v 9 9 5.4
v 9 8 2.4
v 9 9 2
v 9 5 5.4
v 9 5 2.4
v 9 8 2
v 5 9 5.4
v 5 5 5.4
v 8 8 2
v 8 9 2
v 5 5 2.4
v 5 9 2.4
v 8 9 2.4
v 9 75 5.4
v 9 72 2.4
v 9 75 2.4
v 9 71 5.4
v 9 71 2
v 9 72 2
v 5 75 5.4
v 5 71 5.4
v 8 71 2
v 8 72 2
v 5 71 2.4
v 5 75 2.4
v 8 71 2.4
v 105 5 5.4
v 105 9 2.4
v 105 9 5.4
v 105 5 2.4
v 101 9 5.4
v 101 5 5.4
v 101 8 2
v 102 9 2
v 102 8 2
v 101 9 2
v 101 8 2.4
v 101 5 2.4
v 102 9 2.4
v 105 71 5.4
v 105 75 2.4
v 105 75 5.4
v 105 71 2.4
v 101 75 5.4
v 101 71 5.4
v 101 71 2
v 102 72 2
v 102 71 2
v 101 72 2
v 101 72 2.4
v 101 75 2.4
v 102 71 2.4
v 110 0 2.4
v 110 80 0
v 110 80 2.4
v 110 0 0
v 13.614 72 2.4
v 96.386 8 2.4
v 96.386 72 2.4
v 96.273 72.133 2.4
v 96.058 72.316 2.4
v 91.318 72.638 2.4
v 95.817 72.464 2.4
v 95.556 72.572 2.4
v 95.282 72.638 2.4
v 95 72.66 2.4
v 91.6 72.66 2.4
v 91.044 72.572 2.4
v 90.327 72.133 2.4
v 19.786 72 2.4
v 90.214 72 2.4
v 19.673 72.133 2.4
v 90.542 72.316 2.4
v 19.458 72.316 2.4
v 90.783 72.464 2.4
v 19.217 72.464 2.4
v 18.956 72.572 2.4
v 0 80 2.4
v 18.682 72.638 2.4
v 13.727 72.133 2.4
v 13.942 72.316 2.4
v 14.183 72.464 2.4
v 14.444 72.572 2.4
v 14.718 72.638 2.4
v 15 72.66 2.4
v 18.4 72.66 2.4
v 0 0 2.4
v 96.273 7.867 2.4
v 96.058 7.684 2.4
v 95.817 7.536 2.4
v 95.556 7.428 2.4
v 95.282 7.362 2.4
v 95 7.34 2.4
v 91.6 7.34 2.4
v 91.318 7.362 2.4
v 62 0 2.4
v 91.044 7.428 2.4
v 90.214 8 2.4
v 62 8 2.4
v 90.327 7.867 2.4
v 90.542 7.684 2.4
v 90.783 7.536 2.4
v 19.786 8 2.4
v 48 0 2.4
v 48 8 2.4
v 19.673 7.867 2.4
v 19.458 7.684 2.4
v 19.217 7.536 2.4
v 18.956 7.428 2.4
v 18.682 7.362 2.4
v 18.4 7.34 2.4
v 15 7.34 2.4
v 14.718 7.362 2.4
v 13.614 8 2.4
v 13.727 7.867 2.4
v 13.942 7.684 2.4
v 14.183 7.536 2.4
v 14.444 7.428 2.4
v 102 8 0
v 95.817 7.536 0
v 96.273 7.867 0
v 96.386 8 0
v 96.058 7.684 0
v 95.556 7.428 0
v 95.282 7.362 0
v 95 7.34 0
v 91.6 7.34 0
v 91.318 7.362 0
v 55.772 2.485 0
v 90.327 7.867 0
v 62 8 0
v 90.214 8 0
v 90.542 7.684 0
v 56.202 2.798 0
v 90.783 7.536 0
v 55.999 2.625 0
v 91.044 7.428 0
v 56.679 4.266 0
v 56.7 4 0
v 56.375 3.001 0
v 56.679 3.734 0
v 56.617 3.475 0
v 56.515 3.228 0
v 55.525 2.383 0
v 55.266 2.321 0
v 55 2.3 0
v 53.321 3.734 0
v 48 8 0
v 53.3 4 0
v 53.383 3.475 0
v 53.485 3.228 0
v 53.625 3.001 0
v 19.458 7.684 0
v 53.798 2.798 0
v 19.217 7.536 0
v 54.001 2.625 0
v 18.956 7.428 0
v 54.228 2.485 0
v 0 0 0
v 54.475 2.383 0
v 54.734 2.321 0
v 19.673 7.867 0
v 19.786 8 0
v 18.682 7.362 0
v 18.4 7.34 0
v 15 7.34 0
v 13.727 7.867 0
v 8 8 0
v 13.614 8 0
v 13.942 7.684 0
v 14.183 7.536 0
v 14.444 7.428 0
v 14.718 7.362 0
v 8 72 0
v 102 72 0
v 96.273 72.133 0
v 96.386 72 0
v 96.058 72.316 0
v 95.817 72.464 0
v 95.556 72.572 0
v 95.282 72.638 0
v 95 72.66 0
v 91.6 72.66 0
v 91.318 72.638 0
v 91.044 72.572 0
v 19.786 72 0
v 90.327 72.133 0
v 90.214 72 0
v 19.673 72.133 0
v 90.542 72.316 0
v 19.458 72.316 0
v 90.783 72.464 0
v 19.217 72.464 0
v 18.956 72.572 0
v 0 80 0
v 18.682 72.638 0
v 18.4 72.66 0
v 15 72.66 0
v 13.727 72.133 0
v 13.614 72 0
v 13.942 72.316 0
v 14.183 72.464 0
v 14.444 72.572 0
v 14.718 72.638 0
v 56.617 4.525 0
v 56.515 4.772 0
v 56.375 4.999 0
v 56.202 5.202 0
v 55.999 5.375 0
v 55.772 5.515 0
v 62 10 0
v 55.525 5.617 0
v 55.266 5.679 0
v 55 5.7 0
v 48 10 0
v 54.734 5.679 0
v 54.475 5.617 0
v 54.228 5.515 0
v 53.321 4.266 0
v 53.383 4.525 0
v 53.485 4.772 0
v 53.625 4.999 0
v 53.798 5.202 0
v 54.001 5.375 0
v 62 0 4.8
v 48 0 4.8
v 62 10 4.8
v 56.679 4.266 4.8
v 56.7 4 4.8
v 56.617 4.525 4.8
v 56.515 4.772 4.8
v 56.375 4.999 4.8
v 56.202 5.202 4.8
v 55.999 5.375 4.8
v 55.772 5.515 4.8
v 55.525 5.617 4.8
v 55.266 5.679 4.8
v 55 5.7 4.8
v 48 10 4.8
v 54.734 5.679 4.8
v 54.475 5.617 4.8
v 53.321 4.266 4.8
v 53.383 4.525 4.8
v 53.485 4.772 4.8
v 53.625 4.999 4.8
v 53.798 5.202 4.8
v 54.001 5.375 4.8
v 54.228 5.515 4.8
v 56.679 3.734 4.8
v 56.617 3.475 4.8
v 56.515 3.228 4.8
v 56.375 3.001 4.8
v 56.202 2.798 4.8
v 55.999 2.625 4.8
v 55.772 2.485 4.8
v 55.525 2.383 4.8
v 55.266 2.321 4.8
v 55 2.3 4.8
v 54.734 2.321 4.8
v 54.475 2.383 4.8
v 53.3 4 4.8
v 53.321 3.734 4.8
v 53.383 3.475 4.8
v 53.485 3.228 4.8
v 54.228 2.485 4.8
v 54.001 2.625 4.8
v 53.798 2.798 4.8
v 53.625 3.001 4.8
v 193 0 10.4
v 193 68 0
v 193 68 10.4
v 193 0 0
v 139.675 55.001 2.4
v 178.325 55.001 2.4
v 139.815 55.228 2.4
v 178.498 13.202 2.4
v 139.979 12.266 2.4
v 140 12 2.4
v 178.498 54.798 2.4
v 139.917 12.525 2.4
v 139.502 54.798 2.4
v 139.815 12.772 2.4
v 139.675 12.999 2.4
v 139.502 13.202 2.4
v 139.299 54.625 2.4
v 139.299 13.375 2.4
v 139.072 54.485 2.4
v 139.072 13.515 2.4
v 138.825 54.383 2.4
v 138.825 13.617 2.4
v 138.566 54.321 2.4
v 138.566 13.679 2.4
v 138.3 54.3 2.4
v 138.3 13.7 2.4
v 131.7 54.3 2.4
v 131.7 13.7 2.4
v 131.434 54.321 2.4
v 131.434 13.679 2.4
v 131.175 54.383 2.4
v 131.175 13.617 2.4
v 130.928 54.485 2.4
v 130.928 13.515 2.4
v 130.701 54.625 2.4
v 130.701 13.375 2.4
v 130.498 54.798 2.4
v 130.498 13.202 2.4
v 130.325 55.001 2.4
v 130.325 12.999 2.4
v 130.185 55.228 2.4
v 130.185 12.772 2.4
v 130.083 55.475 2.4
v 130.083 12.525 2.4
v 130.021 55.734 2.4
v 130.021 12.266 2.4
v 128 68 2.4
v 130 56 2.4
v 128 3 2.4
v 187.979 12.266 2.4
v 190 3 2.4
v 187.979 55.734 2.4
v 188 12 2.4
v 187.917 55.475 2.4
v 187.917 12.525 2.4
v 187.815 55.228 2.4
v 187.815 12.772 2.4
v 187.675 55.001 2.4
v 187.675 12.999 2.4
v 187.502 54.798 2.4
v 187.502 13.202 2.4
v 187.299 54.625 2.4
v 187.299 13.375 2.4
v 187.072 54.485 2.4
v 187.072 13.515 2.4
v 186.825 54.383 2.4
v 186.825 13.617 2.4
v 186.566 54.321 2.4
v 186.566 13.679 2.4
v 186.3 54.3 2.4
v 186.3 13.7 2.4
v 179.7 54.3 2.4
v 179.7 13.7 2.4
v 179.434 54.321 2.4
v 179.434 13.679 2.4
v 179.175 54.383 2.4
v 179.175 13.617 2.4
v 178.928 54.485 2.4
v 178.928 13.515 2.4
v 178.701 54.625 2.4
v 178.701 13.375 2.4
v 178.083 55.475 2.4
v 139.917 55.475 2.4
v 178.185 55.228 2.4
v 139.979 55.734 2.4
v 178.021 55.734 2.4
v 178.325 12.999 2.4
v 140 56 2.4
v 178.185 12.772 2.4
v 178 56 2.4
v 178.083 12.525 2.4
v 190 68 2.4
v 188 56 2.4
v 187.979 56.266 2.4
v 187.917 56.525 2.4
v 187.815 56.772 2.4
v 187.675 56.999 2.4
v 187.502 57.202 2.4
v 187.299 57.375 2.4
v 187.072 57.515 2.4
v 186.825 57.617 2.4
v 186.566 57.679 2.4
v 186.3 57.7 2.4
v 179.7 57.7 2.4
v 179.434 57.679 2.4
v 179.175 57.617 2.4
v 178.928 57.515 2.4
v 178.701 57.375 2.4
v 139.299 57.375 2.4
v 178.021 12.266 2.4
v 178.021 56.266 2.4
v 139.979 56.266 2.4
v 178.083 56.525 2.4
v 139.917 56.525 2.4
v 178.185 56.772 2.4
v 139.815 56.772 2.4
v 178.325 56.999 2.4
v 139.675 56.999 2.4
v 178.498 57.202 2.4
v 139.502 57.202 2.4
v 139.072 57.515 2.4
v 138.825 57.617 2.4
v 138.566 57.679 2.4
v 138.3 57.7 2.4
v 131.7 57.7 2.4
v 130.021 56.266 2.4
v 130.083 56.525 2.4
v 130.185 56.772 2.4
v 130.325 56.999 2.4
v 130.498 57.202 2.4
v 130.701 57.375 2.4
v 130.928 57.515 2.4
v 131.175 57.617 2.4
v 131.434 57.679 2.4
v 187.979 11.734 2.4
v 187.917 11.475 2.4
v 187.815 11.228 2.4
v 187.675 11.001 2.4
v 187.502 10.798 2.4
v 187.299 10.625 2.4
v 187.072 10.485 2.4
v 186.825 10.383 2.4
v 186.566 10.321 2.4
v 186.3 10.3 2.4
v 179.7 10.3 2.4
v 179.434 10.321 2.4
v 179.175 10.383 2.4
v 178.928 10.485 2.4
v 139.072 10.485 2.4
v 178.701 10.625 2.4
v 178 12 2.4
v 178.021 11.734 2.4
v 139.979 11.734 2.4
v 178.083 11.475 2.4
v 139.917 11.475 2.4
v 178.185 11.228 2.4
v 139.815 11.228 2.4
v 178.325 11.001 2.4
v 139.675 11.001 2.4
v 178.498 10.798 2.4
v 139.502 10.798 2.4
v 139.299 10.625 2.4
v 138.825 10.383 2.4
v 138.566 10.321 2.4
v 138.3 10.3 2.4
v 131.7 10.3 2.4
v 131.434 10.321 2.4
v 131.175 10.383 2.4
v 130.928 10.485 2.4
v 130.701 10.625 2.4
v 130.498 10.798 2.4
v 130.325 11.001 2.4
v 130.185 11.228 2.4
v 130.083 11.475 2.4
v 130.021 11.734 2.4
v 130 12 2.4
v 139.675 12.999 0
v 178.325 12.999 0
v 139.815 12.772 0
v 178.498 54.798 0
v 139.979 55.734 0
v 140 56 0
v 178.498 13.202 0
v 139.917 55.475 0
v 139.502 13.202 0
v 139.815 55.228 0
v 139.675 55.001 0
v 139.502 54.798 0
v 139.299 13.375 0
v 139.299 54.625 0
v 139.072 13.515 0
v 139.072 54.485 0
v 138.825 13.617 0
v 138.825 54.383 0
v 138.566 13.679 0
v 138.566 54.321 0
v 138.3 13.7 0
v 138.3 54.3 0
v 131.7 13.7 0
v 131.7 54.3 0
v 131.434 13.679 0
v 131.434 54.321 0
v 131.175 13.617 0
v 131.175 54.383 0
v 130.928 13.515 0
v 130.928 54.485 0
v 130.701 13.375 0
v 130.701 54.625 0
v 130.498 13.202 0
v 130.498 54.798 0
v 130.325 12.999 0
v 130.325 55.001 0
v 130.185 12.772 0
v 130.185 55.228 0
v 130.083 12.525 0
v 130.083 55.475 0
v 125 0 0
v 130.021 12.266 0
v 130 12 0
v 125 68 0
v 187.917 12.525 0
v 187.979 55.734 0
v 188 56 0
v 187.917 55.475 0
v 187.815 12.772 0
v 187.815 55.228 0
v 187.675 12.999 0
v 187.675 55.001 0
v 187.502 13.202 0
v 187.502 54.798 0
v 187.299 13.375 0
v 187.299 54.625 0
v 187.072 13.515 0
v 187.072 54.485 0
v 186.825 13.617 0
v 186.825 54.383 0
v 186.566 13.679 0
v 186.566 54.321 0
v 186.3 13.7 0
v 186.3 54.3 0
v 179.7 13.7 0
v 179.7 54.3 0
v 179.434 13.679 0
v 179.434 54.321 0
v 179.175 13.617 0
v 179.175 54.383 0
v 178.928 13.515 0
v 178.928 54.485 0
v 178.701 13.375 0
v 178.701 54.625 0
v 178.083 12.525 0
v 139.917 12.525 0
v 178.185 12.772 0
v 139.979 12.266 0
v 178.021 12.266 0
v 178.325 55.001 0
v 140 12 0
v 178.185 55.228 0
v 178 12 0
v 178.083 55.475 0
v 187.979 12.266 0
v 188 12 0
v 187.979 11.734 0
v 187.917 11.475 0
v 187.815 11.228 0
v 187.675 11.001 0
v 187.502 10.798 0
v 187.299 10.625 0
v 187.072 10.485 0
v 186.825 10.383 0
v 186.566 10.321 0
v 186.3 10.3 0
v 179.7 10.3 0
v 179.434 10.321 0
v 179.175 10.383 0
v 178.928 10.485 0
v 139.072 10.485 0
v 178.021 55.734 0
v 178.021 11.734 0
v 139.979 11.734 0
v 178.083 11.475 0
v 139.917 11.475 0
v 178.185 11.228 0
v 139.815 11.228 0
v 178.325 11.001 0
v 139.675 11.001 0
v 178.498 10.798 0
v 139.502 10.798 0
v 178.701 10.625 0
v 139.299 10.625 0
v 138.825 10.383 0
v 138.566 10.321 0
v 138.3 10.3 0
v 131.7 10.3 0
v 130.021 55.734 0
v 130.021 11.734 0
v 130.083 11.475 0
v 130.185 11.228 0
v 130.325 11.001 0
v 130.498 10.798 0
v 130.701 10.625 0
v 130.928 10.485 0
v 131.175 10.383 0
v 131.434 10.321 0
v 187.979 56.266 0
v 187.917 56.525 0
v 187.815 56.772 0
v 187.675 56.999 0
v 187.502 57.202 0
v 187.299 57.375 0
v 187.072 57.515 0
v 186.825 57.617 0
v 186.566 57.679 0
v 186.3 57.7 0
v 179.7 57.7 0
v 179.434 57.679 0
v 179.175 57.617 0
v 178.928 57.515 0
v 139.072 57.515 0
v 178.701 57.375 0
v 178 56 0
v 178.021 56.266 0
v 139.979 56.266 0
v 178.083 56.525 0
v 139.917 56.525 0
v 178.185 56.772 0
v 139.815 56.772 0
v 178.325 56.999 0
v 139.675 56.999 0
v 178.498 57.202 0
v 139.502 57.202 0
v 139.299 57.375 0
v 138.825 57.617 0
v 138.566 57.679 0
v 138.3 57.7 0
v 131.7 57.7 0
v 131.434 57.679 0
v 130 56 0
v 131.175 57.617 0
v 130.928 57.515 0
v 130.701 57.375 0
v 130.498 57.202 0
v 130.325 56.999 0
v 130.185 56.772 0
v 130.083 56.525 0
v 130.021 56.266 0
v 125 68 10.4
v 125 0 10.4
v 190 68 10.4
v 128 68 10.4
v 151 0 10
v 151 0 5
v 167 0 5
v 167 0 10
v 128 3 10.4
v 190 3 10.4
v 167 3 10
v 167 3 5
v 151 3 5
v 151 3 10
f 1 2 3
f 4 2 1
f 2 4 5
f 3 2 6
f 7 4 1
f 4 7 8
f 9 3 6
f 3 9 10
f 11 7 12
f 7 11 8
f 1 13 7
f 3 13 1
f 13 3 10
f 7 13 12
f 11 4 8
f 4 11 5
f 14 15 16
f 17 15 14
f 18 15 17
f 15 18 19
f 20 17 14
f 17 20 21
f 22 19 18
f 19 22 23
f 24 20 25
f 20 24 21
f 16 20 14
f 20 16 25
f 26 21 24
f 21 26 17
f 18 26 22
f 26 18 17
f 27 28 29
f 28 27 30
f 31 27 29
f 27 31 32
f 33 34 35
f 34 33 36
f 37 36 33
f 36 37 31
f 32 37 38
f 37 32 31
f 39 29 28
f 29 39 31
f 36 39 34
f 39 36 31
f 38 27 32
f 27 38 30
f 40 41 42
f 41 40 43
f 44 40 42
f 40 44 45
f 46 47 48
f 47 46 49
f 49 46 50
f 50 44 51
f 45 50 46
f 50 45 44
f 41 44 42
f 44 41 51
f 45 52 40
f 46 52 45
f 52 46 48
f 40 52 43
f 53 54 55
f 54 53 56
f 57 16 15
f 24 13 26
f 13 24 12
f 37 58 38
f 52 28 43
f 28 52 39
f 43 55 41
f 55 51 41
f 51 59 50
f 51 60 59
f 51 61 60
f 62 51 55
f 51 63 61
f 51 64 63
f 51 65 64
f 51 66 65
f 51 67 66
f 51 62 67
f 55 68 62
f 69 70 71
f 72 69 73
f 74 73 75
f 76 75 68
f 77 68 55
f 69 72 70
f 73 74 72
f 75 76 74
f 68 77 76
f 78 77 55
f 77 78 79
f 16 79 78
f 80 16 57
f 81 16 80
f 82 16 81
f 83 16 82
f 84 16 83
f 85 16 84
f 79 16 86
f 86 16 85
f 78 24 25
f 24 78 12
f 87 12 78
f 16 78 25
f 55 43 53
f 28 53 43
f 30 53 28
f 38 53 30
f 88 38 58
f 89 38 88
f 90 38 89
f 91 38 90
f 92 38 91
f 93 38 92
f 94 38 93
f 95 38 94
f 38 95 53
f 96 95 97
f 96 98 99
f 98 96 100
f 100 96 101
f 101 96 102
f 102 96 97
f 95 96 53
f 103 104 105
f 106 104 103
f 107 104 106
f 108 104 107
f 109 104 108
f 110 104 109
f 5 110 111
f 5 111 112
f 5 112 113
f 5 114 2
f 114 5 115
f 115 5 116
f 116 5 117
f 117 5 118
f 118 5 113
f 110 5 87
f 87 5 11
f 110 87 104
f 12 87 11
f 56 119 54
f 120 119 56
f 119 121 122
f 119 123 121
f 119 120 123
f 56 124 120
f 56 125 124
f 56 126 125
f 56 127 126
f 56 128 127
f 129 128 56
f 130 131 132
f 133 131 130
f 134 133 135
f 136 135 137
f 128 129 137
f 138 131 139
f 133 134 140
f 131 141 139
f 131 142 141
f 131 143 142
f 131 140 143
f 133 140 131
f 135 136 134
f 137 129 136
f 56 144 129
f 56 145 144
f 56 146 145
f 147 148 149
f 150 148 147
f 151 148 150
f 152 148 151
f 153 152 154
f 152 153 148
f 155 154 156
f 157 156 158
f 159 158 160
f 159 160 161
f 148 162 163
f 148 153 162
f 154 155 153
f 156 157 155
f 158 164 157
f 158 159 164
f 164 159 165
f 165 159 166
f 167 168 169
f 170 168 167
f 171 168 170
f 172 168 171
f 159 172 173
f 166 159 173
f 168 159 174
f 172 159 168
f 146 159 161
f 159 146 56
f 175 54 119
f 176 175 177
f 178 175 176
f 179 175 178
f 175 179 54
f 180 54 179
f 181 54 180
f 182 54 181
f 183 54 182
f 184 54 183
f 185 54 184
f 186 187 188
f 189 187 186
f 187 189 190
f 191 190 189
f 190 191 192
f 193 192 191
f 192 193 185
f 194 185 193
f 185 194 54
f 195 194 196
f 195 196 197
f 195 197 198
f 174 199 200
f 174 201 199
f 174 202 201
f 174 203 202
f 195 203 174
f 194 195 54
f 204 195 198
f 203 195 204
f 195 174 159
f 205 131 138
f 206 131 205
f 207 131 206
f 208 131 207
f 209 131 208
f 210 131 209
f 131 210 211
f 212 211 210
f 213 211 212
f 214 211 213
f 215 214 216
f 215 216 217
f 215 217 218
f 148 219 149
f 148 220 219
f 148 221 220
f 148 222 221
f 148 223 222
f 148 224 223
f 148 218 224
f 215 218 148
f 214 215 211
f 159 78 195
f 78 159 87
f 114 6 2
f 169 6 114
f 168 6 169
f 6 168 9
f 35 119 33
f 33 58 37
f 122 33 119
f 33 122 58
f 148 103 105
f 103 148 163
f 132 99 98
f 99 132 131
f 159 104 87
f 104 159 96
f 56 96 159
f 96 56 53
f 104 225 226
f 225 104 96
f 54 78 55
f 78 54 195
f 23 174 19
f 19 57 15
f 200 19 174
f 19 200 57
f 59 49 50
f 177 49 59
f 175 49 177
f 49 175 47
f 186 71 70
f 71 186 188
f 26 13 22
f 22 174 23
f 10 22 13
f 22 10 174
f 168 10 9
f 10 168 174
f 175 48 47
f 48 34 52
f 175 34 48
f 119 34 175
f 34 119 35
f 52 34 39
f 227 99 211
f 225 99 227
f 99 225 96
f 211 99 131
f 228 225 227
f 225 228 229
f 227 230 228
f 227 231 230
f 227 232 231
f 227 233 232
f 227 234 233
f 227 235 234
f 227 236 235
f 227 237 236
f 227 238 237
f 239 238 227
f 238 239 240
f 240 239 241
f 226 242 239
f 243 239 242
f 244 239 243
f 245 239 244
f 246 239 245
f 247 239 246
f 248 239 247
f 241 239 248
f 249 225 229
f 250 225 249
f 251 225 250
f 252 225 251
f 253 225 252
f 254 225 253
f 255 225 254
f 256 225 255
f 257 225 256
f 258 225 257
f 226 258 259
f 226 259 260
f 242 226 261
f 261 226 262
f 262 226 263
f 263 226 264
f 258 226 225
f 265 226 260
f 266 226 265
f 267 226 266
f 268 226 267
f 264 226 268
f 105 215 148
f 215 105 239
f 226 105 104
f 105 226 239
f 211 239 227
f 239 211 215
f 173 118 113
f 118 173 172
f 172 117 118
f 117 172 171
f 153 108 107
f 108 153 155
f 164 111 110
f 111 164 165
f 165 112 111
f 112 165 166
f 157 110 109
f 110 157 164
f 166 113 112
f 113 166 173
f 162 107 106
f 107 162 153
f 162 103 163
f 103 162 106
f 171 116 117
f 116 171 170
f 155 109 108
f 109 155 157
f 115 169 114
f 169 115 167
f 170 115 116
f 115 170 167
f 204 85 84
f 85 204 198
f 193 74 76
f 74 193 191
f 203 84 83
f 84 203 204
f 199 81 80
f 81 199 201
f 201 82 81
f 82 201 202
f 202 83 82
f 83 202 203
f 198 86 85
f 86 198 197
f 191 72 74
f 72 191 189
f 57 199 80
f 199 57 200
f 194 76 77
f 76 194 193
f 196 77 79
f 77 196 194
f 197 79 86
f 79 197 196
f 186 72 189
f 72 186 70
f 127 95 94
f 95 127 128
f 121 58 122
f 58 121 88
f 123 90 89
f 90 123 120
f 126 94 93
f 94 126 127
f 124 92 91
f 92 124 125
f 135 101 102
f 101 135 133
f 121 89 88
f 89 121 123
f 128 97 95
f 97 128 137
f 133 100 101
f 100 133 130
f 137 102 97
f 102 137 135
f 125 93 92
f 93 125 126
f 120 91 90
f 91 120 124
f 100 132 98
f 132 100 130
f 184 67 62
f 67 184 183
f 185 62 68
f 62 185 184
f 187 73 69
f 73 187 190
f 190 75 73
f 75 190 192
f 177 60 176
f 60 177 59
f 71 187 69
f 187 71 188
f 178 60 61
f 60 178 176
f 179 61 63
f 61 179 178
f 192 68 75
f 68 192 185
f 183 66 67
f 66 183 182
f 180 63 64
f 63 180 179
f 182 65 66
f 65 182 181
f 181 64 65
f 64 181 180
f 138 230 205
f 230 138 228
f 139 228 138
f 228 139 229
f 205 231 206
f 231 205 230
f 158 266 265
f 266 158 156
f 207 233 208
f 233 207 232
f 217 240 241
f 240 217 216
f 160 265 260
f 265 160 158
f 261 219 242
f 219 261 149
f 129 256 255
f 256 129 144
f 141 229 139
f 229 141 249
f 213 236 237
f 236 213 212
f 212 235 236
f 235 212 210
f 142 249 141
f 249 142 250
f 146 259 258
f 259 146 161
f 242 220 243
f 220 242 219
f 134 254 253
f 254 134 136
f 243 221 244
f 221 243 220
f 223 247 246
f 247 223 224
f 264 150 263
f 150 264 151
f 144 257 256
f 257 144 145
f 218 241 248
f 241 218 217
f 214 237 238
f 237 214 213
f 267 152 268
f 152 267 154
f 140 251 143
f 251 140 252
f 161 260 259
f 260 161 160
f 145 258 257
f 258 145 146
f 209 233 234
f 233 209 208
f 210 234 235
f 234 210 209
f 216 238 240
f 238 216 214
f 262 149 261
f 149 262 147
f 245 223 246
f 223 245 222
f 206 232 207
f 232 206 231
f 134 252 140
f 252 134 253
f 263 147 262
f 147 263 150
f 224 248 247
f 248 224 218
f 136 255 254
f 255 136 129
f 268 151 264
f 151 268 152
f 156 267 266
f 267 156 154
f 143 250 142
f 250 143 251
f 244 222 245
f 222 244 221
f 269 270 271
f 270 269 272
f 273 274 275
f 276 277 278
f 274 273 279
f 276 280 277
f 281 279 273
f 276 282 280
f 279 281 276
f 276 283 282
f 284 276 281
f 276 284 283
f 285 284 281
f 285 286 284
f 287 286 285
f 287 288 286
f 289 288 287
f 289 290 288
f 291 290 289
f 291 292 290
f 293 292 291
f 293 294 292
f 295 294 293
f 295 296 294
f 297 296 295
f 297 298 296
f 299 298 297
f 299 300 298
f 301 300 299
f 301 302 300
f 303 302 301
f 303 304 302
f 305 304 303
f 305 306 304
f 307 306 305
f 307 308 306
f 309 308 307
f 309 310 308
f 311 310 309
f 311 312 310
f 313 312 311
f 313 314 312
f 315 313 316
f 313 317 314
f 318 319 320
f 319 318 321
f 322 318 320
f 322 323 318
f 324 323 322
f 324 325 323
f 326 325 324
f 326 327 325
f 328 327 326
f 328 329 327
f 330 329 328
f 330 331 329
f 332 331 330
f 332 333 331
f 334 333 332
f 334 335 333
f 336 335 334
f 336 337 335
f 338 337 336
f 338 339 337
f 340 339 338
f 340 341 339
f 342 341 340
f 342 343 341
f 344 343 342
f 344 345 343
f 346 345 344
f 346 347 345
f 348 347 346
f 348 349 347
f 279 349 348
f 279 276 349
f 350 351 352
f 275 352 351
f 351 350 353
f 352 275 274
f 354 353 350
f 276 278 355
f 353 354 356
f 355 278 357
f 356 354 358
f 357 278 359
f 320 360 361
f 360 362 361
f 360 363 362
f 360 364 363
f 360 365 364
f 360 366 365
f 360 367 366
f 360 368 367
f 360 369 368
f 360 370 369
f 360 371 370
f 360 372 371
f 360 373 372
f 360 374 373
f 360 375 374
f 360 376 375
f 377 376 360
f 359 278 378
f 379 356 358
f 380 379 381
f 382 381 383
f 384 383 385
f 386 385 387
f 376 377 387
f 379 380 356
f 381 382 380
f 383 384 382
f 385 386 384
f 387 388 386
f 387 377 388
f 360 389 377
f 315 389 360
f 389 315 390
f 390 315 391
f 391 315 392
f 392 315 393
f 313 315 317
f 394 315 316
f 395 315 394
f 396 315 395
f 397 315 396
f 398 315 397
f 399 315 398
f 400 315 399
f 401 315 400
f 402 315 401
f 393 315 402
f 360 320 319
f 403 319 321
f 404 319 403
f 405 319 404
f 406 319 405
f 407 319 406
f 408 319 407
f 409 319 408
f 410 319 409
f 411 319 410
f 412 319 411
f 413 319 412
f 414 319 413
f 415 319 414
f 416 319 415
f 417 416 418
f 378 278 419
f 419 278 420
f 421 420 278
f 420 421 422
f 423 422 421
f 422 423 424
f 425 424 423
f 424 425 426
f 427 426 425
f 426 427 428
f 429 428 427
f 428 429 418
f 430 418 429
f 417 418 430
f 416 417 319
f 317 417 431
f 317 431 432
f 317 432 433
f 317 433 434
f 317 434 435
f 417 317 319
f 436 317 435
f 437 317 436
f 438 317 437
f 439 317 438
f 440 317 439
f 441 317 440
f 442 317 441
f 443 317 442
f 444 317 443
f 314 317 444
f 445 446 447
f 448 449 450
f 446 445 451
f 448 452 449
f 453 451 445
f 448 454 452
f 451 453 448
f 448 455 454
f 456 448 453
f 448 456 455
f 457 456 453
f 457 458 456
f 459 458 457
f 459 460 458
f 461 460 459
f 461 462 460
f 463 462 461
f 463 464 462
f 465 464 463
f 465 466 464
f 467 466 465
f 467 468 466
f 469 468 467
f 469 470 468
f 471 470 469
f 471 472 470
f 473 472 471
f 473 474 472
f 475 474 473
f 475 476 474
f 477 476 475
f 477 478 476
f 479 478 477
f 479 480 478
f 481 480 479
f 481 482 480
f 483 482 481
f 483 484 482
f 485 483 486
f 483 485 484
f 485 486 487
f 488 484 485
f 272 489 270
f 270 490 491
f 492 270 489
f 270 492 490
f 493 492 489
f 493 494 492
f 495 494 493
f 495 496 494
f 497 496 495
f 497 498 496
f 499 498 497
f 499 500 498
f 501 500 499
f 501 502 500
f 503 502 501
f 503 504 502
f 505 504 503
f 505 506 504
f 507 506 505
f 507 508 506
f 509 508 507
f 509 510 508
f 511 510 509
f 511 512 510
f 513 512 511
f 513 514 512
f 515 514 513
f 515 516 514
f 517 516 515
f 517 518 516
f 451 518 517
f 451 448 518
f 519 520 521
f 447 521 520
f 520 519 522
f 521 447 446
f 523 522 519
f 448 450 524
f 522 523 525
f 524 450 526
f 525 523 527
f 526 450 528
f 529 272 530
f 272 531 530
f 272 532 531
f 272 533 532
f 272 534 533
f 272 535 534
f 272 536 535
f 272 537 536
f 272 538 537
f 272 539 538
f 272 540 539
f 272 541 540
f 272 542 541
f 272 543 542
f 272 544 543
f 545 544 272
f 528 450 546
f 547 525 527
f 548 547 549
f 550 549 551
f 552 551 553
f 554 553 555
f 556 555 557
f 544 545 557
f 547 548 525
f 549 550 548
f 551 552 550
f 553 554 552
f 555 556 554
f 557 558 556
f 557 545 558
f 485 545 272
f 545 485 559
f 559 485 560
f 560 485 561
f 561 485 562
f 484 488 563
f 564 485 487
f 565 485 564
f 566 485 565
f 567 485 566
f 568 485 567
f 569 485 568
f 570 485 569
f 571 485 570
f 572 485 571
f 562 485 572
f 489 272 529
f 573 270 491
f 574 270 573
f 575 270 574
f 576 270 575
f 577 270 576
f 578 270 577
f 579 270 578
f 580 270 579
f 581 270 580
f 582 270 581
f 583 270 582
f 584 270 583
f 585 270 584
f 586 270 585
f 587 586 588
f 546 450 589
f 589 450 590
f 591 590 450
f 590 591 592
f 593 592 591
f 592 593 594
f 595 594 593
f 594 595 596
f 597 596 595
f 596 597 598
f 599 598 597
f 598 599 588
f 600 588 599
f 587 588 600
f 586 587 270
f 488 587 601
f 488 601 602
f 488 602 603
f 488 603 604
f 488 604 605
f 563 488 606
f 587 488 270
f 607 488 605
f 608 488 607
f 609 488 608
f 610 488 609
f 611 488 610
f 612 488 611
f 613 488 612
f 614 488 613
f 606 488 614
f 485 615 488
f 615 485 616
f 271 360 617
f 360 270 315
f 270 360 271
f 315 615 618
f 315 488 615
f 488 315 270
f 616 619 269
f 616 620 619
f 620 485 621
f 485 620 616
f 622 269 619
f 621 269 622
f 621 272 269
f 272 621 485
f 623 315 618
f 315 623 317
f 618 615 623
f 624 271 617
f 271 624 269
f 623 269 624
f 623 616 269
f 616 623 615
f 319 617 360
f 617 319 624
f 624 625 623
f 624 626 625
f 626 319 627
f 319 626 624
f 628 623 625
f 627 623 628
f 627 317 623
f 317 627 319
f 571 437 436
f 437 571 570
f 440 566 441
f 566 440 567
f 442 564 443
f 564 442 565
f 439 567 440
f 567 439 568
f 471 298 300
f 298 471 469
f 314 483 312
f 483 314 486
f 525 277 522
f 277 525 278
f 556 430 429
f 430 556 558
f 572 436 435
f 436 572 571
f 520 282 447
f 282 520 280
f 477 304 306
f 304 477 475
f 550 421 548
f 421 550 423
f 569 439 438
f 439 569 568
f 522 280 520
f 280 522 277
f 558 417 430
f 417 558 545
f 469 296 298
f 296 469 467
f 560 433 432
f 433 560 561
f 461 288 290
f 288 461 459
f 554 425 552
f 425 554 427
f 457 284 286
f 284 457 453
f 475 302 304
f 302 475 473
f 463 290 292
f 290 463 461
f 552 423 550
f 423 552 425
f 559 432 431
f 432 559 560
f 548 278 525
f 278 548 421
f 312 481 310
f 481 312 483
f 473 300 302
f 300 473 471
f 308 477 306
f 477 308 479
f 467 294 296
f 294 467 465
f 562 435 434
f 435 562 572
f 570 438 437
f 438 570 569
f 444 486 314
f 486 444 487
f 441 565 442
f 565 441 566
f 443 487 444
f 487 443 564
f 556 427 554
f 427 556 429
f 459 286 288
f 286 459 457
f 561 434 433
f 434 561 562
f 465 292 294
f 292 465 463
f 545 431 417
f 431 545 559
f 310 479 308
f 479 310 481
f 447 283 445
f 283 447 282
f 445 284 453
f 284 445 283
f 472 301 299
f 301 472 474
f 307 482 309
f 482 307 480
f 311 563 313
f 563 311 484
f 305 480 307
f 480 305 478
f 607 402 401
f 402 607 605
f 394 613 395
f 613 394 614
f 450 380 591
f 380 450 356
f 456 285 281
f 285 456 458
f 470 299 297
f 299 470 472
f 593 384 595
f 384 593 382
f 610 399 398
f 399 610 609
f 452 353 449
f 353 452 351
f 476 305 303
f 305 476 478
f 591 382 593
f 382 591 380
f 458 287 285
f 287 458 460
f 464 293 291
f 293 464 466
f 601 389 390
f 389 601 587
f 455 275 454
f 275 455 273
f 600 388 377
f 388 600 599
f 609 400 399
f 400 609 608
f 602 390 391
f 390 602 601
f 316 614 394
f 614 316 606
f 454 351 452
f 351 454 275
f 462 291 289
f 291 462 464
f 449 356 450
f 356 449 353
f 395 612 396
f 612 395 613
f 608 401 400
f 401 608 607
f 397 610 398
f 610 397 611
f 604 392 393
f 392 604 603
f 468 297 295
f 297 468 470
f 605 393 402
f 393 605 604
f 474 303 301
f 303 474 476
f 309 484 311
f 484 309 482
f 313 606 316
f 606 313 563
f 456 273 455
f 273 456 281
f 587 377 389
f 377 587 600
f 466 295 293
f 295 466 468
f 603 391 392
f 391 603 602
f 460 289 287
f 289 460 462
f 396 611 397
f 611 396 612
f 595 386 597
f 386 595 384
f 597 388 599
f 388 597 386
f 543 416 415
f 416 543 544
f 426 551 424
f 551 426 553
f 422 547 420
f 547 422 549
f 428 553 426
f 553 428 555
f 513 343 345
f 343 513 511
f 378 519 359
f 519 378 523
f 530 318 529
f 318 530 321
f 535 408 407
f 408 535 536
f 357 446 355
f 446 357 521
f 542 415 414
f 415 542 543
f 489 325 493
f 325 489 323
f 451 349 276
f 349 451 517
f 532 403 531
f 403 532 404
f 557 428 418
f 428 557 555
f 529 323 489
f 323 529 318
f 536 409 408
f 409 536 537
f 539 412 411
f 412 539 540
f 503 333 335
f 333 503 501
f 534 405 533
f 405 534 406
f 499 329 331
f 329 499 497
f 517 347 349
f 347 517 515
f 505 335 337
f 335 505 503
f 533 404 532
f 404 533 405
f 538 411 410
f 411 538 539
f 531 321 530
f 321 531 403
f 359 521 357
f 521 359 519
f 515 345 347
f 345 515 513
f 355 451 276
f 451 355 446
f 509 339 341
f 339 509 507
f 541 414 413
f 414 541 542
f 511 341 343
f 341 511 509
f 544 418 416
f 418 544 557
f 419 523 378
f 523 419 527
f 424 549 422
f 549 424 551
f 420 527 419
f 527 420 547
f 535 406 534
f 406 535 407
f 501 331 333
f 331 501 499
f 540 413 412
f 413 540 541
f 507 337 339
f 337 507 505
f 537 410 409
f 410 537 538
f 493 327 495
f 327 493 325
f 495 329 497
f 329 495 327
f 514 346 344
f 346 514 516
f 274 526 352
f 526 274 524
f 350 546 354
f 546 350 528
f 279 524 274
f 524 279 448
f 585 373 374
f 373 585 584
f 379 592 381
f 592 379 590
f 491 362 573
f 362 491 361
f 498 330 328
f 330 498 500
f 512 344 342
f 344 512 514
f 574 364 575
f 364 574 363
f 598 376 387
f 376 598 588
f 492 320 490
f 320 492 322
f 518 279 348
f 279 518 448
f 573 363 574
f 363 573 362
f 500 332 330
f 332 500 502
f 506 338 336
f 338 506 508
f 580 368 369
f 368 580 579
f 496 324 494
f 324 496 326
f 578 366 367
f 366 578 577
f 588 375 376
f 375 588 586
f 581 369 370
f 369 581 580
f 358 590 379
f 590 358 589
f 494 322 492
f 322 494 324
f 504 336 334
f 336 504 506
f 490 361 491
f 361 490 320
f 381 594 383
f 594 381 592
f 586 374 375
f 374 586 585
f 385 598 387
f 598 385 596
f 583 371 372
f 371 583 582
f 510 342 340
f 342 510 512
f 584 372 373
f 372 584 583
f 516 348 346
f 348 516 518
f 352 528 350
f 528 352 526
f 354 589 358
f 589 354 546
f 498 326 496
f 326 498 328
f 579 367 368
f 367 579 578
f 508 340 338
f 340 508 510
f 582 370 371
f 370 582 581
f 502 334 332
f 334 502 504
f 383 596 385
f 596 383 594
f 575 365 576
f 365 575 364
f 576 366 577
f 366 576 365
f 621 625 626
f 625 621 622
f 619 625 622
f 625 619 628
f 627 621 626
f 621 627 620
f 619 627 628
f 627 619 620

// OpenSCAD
// Removable peripheral cassettes: 7-15 mm 2.5-inch drive and ESP32 relay board.
// Device-hole coordinates remain adjustable until hardware is measured.

$fn = 40;

part = "set"; // ssd | esp32 | set

ssd_envelope = [100.5, 69.9, 15];
ssd_tray = [110, 80, 2.4];
esp_envelope = [60, 60, 22];
esp_tray = [68, 68, 2.4];

slot_d = 3.6;
slot_length = 12;
ssd_hole_pitch = [76.6, 61.72];
ssd_hole_origin = [(ssd_tray[0] - ssd_hole_pitch[0]) / 2,
                   (ssd_tray[1] - ssd_hole_pitch[1]) / 2];
ssd_retention_axis = [ssd_tray[0] / 2, 4];

module elongated_hole(length, diameter, height) {
    hull() {
        translate([-length / 2 + diameter / 2, 0, 0]) cylinder(h = height, d = diameter);
        translate([ length / 2 - diameter / 2, 0, 0]) cylinder(h = height, d = diameter);
    }
}

module ssd_cassette() {
    color([0.24, 0.25, 0.28])
    difference() {
        union() {
            // Open-centre bridge minimizes obstruction of the backplate channel.
            cube([ssd_tray[0], 8, ssd_tray[2]]);
            translate([0, ssd_tray[1] - 8, 0]) cube([ssd_tray[0], 8, ssd_tray[2]]);
            cube([8, ssd_tray[1], ssd_tray[2]]);
            translate([ssd_tray[0] - 8, 0, 0]) cube([8, ssd_tray[1], ssd_tray[2]]);

            // Low corner locators do not constrain drive thickness; the same
            // tray accepts common 7, 9.5, 12.5 and 15 mm 2.5-inch devices.
            for (x = [5, ssd_tray[0] - 9], y = [5, ssd_tray[1] - 9])
                translate([x, y, ssd_tray[2] - 0.4]) cube([4, 4, 3.4]);

            // Front service ear for one axial M3 retention screw.
            translate([ssd_retention_axis[0] - 7, 0, 0])
                cube([14, 10, 4.8]);
        }

        // SFF-style 76.6 x 61.72 mm bottom pattern with longitudinal tolerance.
        for (x = [ssd_hole_origin[0], ssd_hole_origin[0] + ssd_hole_pitch[0]],
             y = [ssd_hole_origin[1], ssd_hole_origin[1] + ssd_hole_pitch[1]])
            translate([x, y, -0.1])
                elongated_hole(7, slot_d, ssd_tray[2] + 0.2);

        translate([ssd_retention_axis[0], ssd_retention_axis[1], -0.1])
            cylinder(h = 5.0, d = 3.4);
    }
}

module esp32_cassette() {
    color([0.18, 0.36, 0.62])
    difference() {
        union() {
            // Base and three edges; antenna edge remains completely open.
            cube(esp_tray);
            translate([0, 0, esp_tray[2]]) cube([3, esp_tray[1], 8]);
            translate([esp_tray[0] - 3, 0, esp_tray[2]]) cube([3, esp_tray[1], 8]);
            translate([0, 0, esp_tray[2]]) cube([esp_tray[0], 3, 8]);
        }

        // Four broad slots accept sliding PCB posts after hole measurement.
        for (x = [10, esp_tray[0] - 10], y = [12, esp_tray[1] - 12])
            translate([x, y, -0.1]) elongated_hole(10, 3.4, esp_tray[2] + 0.2);

        // Service opening for USB programming cable.
        translate([esp_tray[0] / 2 - 8, -0.1, 5]) cube([16, 4, 5]);
    }
}

if (part == "ssd") ssd_cassette();
else if (part == "esp32") esp32_cassette();
else {
    ssd_cassette();
    translate([ssd_tray[0] + 15, 0, 0]) esp32_cassette();
}

echo("part", part);
echo("supported_ssd_envelope_mm", ssd_envelope);
echo("ssd_bottom_hole_pitch_mm", ssd_hole_pitch);
echo("ssd_retention", "1x front-access M3 plus 4x device M3");
echo("esp32_board_envelope_provisional_mm", esp_envelope);
assert(ssd_envelope[2] <= 15, "SSD exceeds supported maximum thickness");
